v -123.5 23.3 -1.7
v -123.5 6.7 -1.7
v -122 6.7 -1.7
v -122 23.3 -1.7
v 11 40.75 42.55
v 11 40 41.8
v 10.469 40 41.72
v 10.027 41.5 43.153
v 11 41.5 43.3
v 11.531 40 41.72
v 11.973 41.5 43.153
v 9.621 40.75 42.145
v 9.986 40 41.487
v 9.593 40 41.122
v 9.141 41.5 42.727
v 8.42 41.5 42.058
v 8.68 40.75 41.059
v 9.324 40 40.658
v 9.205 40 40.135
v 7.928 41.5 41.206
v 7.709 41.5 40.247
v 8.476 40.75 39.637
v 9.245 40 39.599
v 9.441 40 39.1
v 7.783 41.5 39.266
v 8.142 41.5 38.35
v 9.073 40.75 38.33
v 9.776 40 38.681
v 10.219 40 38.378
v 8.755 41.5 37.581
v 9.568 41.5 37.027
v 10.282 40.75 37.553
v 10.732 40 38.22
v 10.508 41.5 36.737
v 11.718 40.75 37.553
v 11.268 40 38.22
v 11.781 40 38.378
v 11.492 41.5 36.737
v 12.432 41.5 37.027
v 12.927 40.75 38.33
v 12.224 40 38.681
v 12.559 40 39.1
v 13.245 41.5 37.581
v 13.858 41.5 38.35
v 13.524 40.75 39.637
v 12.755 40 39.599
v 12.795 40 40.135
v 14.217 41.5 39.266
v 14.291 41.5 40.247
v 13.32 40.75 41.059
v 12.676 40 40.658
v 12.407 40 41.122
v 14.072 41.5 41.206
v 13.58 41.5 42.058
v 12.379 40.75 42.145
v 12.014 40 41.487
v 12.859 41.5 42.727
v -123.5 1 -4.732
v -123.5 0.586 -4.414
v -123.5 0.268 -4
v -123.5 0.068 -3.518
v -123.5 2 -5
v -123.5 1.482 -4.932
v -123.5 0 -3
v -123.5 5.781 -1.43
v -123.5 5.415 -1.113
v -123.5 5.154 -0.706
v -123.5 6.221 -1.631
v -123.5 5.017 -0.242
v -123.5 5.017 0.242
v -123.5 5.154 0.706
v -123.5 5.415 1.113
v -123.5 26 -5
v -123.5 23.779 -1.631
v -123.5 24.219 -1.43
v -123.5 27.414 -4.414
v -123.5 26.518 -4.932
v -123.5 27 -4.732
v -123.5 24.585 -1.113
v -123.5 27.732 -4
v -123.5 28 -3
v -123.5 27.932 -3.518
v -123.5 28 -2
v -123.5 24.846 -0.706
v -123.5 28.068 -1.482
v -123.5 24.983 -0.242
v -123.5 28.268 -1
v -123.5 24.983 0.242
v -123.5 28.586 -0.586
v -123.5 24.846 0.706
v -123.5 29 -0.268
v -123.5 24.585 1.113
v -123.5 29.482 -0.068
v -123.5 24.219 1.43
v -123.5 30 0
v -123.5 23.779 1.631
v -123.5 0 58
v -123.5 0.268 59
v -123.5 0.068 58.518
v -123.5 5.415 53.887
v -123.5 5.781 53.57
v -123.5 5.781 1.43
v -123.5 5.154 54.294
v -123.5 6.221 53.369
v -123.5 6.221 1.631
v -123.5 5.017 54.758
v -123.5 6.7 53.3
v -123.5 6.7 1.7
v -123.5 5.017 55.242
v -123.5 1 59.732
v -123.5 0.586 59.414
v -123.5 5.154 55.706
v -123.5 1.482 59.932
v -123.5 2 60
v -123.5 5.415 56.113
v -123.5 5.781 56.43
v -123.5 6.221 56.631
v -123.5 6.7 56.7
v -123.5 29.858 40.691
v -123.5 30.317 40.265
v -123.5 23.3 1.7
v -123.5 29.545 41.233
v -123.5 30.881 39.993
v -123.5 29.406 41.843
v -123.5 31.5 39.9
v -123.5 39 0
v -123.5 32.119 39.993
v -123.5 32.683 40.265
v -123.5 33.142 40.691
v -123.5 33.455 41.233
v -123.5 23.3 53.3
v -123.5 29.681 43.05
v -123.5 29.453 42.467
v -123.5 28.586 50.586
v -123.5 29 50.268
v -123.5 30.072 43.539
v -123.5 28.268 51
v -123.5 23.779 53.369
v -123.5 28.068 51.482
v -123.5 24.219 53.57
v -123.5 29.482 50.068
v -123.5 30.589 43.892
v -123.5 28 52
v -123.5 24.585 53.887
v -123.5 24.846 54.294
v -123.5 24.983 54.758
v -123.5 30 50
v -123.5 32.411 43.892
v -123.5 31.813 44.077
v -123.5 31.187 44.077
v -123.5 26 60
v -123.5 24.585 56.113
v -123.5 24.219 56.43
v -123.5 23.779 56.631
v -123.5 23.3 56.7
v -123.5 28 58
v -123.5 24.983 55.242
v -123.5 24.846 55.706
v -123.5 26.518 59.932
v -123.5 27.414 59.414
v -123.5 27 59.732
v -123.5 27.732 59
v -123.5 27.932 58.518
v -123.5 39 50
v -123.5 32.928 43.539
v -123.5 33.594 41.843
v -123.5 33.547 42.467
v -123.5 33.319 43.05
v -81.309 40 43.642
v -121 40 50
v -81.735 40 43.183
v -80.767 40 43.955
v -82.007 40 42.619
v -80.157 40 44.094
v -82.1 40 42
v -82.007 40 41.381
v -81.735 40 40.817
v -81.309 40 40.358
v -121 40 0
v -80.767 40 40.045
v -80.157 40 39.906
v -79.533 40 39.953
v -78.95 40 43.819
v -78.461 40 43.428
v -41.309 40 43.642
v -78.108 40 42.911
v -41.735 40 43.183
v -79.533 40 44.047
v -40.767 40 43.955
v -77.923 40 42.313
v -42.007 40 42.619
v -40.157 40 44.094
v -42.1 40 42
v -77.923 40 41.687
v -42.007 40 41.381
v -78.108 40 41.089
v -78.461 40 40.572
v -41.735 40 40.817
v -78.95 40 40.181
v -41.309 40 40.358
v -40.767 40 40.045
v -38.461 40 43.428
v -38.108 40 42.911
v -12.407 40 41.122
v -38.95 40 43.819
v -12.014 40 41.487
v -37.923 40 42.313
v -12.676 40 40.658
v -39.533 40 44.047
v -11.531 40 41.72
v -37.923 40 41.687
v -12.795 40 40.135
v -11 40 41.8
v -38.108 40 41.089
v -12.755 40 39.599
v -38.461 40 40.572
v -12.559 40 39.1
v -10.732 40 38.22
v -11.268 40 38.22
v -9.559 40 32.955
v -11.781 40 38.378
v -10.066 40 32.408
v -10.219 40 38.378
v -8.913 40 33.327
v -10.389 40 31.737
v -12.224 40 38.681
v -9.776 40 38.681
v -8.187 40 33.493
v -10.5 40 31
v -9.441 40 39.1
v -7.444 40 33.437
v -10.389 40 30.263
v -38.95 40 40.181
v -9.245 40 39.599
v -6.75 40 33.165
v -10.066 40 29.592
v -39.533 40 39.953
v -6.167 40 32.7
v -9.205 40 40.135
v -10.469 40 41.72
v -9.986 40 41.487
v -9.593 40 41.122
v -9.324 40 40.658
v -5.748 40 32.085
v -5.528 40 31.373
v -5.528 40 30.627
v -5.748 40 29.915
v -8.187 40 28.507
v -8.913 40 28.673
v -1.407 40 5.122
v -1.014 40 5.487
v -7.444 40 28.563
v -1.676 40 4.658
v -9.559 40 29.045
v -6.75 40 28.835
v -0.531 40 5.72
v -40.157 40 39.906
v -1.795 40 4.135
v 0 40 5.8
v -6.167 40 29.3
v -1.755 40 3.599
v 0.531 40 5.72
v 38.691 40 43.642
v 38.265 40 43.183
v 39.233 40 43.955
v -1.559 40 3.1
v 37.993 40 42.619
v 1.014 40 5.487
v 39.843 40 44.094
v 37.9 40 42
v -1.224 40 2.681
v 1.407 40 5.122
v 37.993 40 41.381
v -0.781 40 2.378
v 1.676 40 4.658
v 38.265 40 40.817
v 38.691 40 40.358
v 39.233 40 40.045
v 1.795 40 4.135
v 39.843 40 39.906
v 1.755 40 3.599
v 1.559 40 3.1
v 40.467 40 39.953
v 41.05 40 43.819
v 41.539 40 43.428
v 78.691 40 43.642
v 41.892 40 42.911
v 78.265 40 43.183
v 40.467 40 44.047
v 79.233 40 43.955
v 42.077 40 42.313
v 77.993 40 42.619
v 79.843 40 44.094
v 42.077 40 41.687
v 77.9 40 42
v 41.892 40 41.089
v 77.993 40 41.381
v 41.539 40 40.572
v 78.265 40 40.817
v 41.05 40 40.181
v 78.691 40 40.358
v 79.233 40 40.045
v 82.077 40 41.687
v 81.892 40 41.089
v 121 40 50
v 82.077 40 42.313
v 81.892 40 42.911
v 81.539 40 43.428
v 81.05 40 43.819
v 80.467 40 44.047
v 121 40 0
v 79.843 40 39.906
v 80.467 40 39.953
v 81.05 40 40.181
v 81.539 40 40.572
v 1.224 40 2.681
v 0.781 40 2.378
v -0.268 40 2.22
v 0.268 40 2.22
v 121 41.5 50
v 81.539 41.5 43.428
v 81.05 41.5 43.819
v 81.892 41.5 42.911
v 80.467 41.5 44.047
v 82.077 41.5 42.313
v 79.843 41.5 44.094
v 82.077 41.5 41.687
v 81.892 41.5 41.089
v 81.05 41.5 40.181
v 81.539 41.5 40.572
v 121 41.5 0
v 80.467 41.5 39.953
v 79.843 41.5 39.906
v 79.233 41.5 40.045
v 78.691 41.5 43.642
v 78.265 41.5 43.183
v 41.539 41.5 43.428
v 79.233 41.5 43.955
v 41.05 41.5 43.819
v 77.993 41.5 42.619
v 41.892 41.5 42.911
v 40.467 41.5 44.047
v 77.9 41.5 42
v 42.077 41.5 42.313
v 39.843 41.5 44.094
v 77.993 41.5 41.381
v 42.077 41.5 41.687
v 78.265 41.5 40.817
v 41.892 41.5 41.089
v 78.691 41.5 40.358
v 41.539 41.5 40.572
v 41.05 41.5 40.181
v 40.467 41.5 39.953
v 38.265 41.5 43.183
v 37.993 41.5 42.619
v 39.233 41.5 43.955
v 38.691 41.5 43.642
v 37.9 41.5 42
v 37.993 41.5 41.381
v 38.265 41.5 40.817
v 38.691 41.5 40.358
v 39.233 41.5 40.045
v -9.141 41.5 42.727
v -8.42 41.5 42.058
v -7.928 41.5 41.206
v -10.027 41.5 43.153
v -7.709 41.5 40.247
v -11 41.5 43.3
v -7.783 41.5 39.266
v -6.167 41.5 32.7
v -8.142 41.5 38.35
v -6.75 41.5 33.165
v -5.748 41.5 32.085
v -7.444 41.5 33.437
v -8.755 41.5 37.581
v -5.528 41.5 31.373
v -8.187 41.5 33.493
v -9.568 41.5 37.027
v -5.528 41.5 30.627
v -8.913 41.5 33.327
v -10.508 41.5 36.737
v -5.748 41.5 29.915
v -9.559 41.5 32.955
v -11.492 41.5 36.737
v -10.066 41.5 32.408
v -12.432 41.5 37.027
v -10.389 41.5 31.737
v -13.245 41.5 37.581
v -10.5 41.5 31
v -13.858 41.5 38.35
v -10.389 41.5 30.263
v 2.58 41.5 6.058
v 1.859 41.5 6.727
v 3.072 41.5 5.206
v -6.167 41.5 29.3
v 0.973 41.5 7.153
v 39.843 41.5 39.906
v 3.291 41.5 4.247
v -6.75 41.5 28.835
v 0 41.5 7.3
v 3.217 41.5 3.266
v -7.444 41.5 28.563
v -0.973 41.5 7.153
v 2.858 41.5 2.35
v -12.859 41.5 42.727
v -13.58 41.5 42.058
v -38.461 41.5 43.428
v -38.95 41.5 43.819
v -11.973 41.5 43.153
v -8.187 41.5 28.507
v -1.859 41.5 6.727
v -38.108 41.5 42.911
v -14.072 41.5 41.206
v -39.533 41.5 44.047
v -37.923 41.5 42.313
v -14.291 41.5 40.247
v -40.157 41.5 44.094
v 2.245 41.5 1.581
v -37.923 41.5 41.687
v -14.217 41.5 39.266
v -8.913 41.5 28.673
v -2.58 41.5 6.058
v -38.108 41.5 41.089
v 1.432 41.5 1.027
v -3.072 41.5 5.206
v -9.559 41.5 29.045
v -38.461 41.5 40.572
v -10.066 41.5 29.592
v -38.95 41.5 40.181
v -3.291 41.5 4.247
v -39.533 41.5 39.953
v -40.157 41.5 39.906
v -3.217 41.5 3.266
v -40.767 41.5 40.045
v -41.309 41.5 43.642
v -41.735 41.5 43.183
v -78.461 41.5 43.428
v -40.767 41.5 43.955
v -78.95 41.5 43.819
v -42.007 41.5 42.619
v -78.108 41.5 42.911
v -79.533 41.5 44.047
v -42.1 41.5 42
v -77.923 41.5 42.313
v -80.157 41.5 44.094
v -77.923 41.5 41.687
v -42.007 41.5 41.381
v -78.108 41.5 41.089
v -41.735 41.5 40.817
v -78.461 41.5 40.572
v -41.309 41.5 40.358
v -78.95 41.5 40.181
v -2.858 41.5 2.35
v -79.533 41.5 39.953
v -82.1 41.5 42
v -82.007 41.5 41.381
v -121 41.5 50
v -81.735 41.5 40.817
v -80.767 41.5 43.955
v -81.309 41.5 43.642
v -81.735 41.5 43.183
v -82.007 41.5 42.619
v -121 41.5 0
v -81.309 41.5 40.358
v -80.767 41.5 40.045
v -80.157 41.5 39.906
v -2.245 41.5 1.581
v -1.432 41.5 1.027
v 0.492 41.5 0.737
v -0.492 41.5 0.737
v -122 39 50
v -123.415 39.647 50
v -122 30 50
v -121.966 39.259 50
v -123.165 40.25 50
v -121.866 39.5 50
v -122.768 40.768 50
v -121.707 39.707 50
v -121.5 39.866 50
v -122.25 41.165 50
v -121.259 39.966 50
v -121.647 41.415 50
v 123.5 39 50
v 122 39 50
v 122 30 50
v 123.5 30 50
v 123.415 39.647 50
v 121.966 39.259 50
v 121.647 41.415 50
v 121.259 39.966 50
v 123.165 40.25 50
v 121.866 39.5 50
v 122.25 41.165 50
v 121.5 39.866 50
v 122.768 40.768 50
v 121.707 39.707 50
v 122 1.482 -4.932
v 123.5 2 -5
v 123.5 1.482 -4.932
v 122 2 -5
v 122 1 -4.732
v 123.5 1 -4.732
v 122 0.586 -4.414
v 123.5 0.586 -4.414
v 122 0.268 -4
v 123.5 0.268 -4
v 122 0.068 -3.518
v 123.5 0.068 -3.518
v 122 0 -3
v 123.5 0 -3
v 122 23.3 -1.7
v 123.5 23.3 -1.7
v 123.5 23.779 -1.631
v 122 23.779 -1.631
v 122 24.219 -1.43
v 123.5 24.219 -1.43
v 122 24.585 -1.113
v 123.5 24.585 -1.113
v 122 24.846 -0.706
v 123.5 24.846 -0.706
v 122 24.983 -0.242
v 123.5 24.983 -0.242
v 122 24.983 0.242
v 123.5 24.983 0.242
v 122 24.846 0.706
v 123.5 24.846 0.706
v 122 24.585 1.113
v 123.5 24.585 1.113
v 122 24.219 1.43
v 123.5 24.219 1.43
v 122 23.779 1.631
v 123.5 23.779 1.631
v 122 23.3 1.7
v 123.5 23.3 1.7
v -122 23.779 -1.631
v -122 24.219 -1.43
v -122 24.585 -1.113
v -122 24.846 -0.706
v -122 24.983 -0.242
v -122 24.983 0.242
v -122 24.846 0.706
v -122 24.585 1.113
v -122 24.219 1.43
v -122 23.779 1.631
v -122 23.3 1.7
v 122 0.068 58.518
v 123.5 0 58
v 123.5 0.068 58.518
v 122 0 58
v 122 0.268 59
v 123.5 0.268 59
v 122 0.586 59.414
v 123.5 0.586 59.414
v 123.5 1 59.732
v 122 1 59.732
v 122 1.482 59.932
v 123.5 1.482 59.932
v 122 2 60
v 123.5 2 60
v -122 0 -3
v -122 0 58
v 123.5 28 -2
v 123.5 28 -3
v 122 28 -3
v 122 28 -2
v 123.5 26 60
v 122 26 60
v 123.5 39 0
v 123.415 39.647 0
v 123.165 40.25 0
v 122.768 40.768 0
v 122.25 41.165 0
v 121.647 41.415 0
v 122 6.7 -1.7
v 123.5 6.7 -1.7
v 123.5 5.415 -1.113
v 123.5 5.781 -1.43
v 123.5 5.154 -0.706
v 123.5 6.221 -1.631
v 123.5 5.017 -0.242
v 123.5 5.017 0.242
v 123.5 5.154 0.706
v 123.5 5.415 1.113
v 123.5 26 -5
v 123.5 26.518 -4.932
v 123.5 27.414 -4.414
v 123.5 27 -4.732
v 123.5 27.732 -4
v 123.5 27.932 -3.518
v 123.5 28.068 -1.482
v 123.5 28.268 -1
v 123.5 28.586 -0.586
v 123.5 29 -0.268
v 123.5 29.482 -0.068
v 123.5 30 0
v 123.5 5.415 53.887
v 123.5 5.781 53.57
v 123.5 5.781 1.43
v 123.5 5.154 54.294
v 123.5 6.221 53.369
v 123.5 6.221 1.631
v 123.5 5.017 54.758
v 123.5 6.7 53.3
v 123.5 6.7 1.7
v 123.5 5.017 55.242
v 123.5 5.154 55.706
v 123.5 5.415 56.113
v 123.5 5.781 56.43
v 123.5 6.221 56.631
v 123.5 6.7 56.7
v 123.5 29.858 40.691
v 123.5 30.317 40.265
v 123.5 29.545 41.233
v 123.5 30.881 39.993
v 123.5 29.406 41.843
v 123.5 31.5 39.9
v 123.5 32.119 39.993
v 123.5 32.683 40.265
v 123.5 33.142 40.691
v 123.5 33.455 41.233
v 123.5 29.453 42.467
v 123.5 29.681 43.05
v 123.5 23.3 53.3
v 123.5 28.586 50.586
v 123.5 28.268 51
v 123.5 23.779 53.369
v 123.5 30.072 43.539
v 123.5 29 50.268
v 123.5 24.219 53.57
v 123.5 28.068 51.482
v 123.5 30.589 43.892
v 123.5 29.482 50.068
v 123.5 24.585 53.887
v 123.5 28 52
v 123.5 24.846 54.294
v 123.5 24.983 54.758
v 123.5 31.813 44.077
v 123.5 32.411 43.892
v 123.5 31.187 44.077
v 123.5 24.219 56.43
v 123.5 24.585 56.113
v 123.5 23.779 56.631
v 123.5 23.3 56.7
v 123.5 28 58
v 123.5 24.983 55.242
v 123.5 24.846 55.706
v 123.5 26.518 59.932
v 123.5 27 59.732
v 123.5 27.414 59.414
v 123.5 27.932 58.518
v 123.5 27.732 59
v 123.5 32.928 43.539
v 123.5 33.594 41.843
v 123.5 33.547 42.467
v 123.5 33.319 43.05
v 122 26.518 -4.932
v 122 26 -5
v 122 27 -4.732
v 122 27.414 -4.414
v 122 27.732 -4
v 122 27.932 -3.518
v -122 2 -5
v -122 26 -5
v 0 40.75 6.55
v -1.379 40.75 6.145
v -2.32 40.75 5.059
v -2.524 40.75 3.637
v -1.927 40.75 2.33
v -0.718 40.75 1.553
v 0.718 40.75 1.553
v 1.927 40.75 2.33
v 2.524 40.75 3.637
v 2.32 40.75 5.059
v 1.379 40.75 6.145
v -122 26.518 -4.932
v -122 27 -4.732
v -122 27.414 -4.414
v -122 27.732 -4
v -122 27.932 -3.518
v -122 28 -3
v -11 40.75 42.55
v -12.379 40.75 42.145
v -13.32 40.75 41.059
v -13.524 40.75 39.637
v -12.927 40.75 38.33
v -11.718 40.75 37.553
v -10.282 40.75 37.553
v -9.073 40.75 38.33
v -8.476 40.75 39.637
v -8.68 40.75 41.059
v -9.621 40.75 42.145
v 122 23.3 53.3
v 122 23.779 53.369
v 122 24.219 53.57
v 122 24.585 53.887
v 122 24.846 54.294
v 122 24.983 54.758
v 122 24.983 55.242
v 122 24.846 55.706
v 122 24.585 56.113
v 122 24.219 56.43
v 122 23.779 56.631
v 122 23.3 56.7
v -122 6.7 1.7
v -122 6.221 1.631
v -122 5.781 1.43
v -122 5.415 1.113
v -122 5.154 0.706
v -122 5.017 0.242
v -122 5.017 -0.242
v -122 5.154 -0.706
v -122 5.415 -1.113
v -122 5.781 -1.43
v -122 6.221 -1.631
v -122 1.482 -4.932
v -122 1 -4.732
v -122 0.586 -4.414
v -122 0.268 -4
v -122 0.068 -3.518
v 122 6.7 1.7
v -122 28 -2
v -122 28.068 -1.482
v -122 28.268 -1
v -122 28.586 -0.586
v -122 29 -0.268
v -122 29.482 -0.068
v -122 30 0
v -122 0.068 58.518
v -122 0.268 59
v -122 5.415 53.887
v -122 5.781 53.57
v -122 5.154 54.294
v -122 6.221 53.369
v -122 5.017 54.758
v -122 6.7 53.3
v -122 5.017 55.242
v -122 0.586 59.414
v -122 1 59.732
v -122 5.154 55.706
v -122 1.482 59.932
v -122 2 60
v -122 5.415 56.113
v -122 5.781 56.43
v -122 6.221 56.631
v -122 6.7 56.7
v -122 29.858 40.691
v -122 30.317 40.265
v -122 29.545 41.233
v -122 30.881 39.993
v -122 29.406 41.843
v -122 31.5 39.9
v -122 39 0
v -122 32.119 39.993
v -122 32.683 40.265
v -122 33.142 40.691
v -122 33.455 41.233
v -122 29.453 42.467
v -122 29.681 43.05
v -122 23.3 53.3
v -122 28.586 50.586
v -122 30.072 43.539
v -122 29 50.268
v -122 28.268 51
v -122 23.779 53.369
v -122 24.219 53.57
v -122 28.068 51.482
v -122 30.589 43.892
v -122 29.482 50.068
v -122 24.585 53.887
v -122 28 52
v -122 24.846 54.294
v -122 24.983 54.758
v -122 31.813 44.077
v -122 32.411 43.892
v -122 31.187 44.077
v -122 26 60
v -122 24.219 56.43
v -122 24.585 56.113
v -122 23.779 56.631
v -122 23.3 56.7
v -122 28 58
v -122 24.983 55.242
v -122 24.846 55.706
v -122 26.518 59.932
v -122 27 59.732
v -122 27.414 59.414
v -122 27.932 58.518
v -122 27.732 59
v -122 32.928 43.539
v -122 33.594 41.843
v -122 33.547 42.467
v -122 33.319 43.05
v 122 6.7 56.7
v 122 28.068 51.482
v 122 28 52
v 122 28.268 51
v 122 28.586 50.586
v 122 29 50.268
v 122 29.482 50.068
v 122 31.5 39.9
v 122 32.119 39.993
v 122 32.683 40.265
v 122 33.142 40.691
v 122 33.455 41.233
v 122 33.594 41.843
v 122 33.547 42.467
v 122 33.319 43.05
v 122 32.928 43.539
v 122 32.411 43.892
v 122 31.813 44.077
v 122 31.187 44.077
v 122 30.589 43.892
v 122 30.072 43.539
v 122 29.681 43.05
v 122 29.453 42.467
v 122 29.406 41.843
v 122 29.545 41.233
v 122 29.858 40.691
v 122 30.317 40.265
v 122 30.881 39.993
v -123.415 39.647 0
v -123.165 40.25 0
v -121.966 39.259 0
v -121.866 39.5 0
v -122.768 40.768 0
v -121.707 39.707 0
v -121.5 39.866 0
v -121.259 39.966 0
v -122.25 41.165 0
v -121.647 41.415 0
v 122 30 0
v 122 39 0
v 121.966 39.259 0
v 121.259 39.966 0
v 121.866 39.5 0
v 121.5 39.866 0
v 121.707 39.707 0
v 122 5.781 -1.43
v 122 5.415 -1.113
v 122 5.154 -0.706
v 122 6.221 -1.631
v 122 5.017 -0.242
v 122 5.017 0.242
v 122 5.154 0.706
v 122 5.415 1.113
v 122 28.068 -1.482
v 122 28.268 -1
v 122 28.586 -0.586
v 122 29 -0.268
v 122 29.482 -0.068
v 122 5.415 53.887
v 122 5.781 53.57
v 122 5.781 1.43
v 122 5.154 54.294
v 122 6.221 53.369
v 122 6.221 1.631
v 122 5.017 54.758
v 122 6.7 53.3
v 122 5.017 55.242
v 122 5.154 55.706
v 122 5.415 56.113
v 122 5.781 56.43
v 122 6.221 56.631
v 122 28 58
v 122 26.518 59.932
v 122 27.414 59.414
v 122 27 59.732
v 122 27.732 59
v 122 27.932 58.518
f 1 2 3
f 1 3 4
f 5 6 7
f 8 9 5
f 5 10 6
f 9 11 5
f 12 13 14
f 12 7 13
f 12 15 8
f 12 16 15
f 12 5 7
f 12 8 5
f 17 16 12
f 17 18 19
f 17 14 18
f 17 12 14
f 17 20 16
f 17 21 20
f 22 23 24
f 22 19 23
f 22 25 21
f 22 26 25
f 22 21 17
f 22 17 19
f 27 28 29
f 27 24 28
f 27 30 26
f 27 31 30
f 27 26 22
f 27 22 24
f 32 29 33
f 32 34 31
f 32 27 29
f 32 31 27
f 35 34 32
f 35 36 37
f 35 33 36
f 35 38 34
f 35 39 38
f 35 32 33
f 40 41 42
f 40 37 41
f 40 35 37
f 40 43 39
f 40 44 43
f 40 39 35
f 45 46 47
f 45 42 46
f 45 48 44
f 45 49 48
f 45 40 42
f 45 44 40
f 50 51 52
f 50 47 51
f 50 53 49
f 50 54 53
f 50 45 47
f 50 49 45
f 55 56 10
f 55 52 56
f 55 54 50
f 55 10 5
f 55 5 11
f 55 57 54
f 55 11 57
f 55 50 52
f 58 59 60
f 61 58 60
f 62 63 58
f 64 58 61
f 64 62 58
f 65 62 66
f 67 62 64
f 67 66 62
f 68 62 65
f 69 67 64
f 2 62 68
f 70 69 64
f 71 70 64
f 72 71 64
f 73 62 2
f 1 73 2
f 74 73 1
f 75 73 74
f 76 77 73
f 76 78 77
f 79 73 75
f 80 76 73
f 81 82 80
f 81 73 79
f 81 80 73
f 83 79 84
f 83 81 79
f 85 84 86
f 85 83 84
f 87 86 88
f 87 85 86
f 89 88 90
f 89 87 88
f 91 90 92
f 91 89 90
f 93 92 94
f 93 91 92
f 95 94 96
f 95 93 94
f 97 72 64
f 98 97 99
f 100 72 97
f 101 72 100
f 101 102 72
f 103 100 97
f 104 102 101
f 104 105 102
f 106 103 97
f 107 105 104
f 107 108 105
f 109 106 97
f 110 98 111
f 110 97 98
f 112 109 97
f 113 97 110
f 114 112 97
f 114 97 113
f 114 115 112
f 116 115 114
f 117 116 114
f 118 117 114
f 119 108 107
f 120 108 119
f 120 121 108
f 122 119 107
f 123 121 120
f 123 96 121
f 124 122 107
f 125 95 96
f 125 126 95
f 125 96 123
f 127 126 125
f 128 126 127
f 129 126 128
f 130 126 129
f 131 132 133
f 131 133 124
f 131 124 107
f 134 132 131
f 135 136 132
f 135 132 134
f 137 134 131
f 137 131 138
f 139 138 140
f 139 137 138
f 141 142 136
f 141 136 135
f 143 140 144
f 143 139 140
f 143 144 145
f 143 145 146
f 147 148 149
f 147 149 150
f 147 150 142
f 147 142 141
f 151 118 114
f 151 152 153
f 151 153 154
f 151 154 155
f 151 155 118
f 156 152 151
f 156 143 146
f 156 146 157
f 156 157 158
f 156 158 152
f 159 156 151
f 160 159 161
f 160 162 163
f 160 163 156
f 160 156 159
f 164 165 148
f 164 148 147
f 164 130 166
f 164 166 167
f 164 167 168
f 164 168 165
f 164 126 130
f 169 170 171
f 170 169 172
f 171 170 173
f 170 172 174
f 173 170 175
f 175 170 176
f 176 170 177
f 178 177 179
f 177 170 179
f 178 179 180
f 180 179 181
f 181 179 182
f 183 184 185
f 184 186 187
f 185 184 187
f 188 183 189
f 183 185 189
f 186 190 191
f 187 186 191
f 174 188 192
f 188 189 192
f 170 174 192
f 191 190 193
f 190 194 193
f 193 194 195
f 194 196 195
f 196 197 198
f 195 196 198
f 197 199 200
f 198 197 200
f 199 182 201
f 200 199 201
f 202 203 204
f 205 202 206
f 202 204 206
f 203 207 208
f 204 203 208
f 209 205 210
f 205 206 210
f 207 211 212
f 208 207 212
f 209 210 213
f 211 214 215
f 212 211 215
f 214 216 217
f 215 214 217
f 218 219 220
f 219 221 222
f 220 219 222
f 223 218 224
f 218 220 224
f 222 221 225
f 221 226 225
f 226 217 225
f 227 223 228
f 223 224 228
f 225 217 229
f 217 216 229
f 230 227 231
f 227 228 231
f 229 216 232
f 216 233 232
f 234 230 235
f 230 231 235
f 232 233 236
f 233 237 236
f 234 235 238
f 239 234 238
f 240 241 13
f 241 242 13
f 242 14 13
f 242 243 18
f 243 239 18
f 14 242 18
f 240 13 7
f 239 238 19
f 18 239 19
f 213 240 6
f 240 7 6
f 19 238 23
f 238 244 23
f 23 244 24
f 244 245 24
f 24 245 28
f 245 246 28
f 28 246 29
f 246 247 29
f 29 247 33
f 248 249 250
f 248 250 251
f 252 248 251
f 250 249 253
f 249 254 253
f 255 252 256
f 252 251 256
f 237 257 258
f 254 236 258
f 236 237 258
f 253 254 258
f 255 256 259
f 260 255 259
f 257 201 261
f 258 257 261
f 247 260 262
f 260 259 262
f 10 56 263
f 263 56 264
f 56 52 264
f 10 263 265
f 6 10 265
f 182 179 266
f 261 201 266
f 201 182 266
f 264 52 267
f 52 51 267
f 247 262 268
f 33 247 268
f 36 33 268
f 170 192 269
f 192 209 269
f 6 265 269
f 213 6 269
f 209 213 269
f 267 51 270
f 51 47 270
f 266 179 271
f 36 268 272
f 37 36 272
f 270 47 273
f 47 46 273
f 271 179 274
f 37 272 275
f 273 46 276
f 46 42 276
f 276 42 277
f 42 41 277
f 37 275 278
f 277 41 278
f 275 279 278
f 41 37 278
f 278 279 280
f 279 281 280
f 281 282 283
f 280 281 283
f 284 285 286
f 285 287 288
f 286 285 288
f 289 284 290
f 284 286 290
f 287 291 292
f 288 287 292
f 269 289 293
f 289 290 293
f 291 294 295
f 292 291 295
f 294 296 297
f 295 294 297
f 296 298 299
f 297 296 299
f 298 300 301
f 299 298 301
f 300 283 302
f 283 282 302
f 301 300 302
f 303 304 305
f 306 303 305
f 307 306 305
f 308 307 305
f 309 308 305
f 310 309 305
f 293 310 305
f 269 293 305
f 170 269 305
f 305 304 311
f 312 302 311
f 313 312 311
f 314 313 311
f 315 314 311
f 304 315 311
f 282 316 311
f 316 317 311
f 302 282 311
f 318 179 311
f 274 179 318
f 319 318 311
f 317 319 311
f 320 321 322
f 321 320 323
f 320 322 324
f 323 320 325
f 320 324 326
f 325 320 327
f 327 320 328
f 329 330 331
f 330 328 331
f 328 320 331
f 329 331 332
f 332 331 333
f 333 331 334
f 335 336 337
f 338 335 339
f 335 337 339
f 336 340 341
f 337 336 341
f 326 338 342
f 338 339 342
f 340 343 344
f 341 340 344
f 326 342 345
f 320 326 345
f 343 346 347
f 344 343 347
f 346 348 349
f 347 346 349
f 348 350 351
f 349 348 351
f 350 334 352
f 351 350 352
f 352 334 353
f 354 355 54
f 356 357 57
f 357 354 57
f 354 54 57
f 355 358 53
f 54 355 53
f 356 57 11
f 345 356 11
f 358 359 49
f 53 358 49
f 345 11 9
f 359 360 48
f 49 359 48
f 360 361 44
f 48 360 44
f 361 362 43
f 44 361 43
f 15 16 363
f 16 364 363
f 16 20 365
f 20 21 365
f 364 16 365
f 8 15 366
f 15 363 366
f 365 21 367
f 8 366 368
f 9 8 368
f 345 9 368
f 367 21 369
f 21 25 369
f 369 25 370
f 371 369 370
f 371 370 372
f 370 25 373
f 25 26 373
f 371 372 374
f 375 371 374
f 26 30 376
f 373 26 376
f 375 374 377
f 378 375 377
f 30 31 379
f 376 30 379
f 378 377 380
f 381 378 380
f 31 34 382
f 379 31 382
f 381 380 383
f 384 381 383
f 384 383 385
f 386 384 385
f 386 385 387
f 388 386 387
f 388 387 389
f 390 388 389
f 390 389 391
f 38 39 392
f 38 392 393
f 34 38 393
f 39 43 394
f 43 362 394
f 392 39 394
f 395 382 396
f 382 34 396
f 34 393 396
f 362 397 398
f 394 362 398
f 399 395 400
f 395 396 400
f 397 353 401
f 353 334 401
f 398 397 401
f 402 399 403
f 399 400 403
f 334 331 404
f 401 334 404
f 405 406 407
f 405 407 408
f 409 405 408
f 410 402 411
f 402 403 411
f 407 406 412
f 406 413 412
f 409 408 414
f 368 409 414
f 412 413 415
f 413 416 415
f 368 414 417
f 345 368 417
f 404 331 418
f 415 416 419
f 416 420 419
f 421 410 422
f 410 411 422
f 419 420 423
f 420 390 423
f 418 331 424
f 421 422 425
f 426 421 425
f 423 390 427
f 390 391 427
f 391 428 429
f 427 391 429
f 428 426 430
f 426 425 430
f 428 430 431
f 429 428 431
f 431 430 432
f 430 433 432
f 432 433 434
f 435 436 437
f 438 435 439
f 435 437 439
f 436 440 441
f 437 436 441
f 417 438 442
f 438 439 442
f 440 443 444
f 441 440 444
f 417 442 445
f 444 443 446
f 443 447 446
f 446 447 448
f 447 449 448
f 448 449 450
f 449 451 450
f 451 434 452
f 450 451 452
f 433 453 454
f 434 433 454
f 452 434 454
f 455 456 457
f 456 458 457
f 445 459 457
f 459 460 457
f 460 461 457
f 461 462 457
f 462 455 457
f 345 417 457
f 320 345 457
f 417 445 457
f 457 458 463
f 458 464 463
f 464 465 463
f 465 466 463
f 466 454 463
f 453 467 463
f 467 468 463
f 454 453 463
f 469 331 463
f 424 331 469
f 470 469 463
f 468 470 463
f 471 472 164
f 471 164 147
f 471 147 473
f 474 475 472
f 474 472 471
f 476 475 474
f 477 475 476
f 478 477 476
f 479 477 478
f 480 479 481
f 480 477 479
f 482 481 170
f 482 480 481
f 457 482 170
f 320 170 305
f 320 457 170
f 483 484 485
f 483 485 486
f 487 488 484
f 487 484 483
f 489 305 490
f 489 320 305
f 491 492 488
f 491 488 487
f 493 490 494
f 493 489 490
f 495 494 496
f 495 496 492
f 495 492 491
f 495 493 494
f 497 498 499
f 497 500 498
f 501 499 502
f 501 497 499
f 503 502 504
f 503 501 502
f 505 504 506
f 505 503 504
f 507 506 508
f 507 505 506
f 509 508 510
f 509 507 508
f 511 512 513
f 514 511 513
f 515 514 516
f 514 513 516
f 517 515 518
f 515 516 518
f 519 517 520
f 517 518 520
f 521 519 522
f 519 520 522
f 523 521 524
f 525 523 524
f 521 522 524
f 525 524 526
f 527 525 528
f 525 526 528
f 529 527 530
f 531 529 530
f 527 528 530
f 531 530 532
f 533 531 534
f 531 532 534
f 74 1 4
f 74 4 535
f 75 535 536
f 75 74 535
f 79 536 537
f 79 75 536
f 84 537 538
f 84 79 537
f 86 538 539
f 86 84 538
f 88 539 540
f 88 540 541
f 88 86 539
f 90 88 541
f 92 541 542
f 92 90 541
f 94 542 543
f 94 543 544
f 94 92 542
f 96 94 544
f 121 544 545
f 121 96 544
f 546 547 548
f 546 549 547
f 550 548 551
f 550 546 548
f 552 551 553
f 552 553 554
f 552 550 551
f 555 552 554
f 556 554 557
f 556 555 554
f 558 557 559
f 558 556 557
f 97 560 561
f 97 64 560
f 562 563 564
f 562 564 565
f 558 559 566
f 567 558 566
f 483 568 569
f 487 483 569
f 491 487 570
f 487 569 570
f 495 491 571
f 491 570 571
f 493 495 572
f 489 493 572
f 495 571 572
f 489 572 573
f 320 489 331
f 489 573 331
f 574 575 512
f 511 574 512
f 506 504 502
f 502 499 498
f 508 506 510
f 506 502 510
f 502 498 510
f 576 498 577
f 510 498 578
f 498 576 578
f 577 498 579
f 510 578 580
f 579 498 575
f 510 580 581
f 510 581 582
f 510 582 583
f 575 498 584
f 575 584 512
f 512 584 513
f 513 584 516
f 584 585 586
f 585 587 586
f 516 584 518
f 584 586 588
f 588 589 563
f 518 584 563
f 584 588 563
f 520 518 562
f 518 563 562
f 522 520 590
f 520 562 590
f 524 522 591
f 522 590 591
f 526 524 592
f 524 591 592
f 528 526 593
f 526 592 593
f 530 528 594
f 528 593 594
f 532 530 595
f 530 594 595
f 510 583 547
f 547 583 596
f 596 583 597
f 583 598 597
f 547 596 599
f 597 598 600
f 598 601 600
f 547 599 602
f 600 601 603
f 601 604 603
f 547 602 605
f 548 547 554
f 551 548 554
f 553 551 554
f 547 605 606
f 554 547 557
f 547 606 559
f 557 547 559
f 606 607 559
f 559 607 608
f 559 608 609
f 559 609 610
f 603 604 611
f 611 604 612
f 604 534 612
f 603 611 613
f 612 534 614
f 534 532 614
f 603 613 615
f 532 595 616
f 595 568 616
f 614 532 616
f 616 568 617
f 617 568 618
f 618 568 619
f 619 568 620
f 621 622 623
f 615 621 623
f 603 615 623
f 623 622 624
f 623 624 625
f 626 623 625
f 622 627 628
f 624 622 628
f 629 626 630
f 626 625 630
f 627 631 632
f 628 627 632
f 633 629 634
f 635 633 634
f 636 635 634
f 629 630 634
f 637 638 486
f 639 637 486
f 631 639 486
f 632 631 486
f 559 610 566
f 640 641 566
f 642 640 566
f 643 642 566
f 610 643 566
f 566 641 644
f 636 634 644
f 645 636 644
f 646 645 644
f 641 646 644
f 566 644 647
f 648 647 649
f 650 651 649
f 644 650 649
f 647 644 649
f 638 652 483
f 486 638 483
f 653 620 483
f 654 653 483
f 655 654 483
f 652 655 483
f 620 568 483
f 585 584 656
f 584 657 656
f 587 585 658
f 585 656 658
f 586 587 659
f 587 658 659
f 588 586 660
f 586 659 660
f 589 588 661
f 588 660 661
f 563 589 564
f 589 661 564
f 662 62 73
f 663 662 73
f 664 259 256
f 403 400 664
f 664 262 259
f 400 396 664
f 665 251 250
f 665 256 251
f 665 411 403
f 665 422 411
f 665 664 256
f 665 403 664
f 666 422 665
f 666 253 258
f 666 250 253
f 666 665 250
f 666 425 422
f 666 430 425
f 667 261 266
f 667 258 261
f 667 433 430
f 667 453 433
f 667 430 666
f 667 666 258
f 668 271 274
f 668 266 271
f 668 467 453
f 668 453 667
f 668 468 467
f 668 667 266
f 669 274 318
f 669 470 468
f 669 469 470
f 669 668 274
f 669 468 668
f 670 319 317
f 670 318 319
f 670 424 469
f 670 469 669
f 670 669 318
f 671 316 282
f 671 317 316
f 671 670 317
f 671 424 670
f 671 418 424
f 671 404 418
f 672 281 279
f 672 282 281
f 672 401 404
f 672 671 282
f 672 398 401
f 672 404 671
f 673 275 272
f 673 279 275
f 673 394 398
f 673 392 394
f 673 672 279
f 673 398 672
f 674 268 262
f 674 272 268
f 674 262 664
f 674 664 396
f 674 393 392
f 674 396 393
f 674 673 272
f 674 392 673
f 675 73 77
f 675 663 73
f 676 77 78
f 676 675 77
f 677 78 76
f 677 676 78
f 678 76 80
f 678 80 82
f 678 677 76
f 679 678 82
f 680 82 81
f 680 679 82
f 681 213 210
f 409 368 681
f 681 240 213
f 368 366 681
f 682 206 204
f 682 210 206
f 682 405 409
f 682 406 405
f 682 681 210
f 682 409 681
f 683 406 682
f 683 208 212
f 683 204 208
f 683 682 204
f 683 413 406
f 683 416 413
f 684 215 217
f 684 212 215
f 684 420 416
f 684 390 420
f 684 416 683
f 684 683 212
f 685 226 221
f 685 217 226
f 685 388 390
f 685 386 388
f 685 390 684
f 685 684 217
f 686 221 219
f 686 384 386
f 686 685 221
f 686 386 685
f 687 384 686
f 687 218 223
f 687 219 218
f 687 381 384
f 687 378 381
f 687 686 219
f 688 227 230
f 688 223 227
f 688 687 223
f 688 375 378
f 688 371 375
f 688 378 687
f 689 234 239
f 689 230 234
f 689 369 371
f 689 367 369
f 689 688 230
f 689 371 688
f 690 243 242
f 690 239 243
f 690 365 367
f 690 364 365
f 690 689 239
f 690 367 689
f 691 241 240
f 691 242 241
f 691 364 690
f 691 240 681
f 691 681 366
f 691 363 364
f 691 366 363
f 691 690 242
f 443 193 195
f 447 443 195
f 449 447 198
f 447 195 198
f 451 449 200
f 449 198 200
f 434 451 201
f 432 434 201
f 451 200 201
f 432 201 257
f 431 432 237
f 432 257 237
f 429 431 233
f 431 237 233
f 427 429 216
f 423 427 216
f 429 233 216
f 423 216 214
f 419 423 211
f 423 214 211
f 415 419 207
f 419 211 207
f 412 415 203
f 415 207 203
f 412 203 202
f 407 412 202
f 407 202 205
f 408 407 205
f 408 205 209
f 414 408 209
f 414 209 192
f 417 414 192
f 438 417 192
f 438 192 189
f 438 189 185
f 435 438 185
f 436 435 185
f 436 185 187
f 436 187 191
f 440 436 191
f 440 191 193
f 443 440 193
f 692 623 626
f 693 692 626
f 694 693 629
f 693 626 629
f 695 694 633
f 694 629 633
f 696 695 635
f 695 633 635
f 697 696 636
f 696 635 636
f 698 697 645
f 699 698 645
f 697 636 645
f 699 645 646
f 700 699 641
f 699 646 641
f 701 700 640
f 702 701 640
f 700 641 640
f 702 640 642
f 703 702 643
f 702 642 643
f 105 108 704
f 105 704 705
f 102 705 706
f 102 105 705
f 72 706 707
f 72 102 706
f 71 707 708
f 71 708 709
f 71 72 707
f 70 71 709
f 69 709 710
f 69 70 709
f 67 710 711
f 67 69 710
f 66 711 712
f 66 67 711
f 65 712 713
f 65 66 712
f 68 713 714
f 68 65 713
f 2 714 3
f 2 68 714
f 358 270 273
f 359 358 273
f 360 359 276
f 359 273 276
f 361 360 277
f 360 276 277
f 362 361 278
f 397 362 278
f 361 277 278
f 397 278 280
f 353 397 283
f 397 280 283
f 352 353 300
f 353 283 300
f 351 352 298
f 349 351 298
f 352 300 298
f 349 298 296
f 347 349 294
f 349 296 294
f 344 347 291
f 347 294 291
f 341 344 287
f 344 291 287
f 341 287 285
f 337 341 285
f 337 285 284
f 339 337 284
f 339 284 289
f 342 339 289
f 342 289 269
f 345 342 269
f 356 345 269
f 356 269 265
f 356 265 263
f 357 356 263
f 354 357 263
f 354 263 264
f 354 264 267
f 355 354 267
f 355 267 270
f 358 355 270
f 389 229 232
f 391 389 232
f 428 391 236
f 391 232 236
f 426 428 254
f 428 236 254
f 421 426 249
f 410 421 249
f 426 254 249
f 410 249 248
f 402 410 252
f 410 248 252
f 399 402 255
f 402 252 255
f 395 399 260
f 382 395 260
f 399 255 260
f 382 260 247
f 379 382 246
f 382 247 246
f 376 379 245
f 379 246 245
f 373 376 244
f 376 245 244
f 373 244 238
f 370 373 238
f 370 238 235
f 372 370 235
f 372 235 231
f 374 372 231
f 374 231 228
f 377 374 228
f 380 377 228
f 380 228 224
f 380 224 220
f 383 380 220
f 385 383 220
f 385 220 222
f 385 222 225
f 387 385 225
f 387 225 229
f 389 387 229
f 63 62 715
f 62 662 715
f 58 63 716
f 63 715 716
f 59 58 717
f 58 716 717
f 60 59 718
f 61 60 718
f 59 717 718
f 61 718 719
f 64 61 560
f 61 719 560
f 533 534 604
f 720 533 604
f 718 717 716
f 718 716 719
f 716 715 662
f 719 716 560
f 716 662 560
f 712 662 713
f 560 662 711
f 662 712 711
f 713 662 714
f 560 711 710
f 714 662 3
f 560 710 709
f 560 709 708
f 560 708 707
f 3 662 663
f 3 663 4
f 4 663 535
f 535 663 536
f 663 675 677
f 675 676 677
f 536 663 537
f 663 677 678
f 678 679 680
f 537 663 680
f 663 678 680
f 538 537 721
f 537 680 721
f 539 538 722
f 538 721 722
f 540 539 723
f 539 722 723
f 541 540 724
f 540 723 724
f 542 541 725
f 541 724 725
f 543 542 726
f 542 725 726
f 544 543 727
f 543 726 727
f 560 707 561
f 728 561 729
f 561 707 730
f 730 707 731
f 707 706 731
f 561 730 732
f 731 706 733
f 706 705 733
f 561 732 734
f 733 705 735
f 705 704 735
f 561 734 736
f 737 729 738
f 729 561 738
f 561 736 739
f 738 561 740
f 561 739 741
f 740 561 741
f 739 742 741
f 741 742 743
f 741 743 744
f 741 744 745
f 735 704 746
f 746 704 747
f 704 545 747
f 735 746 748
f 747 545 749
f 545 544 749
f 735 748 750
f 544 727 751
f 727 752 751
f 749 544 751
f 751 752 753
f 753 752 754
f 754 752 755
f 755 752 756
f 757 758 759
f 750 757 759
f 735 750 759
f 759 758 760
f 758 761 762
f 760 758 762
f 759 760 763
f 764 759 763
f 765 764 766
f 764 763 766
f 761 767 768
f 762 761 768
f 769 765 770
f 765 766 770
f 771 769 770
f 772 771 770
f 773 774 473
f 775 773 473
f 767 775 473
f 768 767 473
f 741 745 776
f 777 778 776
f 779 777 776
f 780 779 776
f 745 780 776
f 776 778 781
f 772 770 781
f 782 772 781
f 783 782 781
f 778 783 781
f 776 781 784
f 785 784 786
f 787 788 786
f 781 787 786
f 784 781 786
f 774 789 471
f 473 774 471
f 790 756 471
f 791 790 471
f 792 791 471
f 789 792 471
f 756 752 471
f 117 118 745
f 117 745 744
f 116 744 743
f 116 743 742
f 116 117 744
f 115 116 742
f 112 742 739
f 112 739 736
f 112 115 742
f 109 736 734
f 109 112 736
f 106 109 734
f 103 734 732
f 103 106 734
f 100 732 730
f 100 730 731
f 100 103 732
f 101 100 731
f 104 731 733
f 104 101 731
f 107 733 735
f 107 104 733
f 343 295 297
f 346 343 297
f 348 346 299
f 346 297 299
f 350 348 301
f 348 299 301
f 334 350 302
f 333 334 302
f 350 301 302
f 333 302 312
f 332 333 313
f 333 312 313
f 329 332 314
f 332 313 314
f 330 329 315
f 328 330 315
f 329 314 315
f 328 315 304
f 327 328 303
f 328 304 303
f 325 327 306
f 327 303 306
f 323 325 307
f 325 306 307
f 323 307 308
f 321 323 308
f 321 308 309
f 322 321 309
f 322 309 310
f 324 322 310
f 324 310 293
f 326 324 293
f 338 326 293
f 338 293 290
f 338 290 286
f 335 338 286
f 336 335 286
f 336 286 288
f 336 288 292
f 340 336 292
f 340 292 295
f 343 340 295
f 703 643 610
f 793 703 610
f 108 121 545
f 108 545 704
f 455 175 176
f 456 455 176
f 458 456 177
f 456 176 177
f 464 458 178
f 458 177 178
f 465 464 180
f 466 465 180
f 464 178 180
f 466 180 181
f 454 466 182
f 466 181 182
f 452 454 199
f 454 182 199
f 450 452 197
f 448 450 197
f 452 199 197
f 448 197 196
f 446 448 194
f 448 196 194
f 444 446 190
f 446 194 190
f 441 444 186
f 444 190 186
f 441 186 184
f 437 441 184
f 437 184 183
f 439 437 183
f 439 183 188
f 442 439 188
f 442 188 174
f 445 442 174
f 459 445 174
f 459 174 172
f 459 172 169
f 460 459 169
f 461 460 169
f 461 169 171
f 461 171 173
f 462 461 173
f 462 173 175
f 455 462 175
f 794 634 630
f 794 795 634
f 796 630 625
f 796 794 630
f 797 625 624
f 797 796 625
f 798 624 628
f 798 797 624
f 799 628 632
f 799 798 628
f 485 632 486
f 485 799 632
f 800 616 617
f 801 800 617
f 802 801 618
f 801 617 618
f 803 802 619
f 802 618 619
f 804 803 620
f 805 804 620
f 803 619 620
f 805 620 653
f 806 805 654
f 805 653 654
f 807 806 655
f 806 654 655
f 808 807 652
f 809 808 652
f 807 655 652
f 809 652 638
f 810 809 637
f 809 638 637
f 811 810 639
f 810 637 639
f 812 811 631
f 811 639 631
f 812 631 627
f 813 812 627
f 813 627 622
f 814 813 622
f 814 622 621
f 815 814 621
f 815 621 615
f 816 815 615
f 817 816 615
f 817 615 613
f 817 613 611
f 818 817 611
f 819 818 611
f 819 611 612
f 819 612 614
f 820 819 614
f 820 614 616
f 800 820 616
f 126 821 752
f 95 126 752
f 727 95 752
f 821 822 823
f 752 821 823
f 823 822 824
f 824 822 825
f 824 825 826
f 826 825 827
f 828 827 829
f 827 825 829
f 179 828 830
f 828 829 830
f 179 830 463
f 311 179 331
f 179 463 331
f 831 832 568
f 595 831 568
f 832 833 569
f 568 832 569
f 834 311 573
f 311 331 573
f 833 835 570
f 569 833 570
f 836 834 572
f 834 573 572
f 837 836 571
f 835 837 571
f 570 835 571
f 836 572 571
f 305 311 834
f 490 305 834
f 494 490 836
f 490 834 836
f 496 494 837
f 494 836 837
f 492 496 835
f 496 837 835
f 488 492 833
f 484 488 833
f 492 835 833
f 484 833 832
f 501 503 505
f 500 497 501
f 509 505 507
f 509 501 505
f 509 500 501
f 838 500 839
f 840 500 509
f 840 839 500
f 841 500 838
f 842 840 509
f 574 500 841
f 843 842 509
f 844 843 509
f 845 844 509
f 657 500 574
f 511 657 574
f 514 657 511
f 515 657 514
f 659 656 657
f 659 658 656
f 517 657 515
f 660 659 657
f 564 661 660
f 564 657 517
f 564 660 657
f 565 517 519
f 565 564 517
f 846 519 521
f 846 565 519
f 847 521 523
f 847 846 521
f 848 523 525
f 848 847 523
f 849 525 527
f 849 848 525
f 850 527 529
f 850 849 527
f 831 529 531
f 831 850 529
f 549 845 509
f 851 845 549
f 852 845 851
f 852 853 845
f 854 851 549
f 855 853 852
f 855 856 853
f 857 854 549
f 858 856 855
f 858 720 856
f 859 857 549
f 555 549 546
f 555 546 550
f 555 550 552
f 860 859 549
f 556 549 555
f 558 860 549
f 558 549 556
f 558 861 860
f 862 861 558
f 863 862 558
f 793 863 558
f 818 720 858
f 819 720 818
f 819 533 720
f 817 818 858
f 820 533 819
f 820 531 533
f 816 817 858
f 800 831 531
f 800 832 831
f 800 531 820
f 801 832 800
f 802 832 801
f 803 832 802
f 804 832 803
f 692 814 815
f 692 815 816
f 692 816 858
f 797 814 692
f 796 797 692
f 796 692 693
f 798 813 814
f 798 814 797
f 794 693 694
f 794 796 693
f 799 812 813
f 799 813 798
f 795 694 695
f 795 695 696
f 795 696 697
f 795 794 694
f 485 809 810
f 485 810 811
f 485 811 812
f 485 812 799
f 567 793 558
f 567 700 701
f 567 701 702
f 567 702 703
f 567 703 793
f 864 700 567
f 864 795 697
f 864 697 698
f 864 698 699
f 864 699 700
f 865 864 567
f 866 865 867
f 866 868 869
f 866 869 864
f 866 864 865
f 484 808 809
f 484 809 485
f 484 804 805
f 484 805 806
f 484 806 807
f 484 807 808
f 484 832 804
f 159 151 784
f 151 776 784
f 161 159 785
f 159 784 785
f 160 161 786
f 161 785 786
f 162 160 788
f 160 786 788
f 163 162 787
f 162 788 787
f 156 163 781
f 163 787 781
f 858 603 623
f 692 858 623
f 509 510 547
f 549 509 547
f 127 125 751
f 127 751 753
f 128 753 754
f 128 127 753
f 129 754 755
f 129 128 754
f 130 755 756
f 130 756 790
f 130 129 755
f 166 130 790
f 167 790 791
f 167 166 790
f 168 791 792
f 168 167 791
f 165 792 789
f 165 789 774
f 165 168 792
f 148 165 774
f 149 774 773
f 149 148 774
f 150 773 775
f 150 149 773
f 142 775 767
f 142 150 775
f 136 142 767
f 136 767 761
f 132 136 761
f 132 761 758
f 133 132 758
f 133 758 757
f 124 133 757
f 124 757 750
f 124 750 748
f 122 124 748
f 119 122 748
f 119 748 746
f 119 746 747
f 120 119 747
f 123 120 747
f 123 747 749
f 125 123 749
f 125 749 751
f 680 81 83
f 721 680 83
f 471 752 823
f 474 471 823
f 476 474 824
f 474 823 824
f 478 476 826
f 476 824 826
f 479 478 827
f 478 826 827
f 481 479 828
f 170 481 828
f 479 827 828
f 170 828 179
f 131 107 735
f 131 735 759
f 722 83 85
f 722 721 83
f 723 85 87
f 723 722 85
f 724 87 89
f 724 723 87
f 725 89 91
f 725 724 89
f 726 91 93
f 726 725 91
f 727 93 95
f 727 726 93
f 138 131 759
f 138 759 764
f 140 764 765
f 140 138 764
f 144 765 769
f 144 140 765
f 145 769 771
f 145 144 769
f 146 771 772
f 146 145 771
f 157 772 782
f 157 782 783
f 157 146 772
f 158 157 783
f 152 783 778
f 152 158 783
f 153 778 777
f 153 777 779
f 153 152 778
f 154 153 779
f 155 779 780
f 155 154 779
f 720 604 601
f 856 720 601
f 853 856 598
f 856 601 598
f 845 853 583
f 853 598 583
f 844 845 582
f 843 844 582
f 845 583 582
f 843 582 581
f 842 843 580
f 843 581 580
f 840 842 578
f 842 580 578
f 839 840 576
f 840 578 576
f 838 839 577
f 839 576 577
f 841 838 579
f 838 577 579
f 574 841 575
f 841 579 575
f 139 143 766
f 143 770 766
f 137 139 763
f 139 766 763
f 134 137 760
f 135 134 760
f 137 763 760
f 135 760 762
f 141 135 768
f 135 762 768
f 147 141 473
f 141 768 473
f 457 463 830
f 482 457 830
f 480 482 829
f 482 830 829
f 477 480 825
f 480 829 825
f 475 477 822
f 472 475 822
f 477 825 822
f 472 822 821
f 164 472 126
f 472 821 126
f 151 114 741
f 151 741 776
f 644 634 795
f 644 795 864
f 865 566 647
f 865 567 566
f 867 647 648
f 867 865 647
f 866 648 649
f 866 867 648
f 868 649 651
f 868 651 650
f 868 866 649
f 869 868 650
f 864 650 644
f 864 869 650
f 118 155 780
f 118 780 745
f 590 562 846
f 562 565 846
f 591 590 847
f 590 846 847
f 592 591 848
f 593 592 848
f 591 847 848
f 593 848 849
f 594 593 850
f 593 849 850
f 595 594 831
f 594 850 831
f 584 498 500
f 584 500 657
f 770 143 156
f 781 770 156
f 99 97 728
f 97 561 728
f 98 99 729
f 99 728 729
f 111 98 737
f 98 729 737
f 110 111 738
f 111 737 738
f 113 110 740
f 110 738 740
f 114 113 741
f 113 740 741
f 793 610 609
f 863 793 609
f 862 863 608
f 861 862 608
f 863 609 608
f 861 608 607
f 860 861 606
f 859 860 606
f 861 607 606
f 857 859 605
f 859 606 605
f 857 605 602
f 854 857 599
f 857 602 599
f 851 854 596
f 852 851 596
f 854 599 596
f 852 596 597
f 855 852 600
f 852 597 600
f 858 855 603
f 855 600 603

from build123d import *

# Parameters (mm, degrees)
SM_BASE_FLANGE_1_DEPTH       = 50
HOLE_WIZARD_1_AT_2_COUNT     = 2
HOLE_WIZARD_1_AT_2_PITCH     = 37.643060449
HOLE_WIZARD_1_AT_3_COUNT     = 2
HOLE_WIZARD_1_AT_3_PITCH     = 37.643060449
HOLE_WIZARD_4_2_4_2_1_D      = 4.2
HOLE_WIZARD_4_2_4_2_2_REACH  = 257.404
HOLE_WIZARD_4_2_4_2_2_BORE_R = 2.1
HOLE_WIZARD_5_0_5_1_D        = 5
SKETCH_18_W                  = 65
SKETCH_18_H                  = 28
SM_BASE_FLANGE_1_2_DEPTH     = 1.5
HOLE_START                   = -123.5
HOLE_WIZARD_3_4_3_4_2_DEPTH  = 1.5
FILLET_1_R                   = 2
FILLET_1_OF_MIRROR_2_R       = 2


# Read off the part's stored shape, not the designer's step: 基体-法兰1, Ø3.4 (3.4) 直径槽口2
# Sheet-metal steps are written as plain solids
with BuildPart() as part:
    # Sm Base Flange 1 outline → Sm Base Flange 1 (new body)
    with BuildSketch(Plane.XY):
        with BuildLine():
            Line((122, 39), (122, 0))
            Line((122, 0), (123.5, 0))
            Line((123.5, 0), (123.5, 39))
            ThreePointArc((123.5, 39), (122.767766953, 40.767766953), (121, 41.5))
            Line((121, 41.5), (-121, 41.5))
            ThreePointArc((-121, 41.5), (-122.767766953, 40.767766953), (-123.5, 39))
            Line((-123.5, 39), (-123.5, 0))
            Line((-123.5, 0), (-122, 0))
            Line((-122, 0), (-122, 39))
            ThreePointArc((-122, 39), (-121.707106781, 39.707106781), (-121, 40))
            Line((-121, 40), (121, 40))
            ThreePointArc((121, 40), (121.707106781, 39.707106781), (122, 39))
        make_face()
    extrude(amount=SM_BASE_FLANGE_1_DEPTH)

    # 草图9 → 打孔尺寸(%根据)开槽沉头木螺钉的类型1 (revolve, cut)
    with BuildSketch(Plane(origin=(0, 41.5, 4), x_dir=(0, 0, 1), z_dir=(1, 0, 0))):
        Polygon((0, 0), (0, 1.5), (1.7, 1.5), (1.7, 1.6), (3.3, 0), align=None)
    hole_wizard_1 = revolve(axis=Axis((0, 47.85, 4), (0, -1, 0)), mode=Mode.SUBTRACT)

    # 打孔尺寸(%根据)开槽沉头木螺钉的类型1 at 2: 打孔尺寸(%根据)开槽沉头木螺钉的类型1 ×2
    with Locations(*[Vector(-0.29221853559902017, 0, 0.956351571051339) * (i * HOLE_WIZARD_1_AT_2_PITCH) for i in range(1, HOLE_WIZARD_1_AT_2_COUNT)]):
        add(hole_wizard_1, mode=Mode.SUBTRACT)

    # 打孔尺寸(%根据)开槽沉头木螺钉的类型1 at 3: 打孔尺寸(%根据)开槽沉头木螺钉的类型1 ×2
    with Locations(*[Vector(0.2922185355990204, 0, 0.956351571051339) * (i * HOLE_WIZARD_1_AT_3_PITCH) for i in range(1, HOLE_WIZARD_1_AT_3_COUNT)]):
        add(hole_wizard_1, mode=Mode.SUBTRACT)

    # Ø4.2 (4.2) 直径孔1 (through all)
    with Locations(Plane(origin=(0, 41.5, 0), x_dir=(1, 0, 0), z_dir=(0, 1, 0))):
        with Locations((-40, -42), (-80, -42), (40, -42), (80, -42)):
            Hole(HOLE_WIZARD_4_2_4_2_1_D / 2)

    # Ø4.2 (4.2) 直径孔2 bore → Ø4.2 (4.2) 直径孔2 (cut, up to next)
    with BuildSketch(Plane(origin=(123.5, 0, 0), x_dir=(0, 0, -1), z_dir=(1, 0, 0)), mode=Mode.PRIVATE) as hole_wizard_4_2_4_2_2_sk1:
        with Locations((-42, 31.5)):
            Circle(HOLE_WIZARD_4_2_4_2_2_BORE_R)
    hole_wizard_4_2_4_2_2_tool1 = extrude(hole_wizard_4_2_4_2_2_sk1.sketch, amount=-HOLE_WIZARD_4_2_4_2_2_REACH, mode=Mode.PRIVATE) & part.part
    hole_wizard_4_2_4_2_2 = hole_wizard_4_2_4_2_2_tool1.solids().sort_by_distance((123.5, 31.5, 42))[0]
    add(hole_wizard_4_2_4_2_2, mode=Mode.SUBTRACT)

    # 镜向1: Ø4.2 (4.2) 直径孔2 across plane
    add(hole_wizard_4_2_4_2_2.mirror(Plane(origin=(0, 0, 0), x_dir=(0, 0, 1), z_dir=(1, 0, 0))), mode=Mode.SUBTRACT)

    # Ø5.0 (5) 直径孔1 (through all)
    with Locations(Plane(origin=(0, 41.5, 0), x_dir=(1, 0, 0), z_dir=(0, 1, 0))):
        with Locations((-8, -31)):
            Hole(HOLE_WIZARD_5_0_5_1_D / 2)

    # 草图18 → Sm Base Flange 1 2 (add)
    with BuildSketch(Plane.ZY.offset(123.5)):
        with Locations((27.5, 14)):
            Rectangle(SKETCH_18_W, SKETCH_18_H)
    sm_base_flange_1_2 = extrude(amount=-SM_BASE_FLANGE_1_2_DEPTH)

    # Ø3.4 (3.4) 直径槽口2 outline → Ø3.4 (3.4) 直径槽口2 (cut)
    with BuildSketch(Plane.YZ.offset(HOLE_START)):
        with BuildLine():
            ThreePointArc((23.3, 53.3), (25, 55), (23.3, 56.7))
            Line((23.3, 56.7), (6.7, 56.7))
            ThreePointArc((6.7, 56.7), (5, 55), (6.7, 53.3))
            Line((6.7, 53.3), (23.3, 53.3))
        make_face()
        with BuildLine():
            ThreePointArc((23.3, -1.7), (25, 0), (23.3, 1.7))
            Line((23.3, 1.7), (6.7, 1.7))
            ThreePointArc((6.7, 1.7), (5, 0), (6.7, -1.7))
            Line((6.7, -1.7), (23.3, -1.7))
        make_face()
    hole_wizard_3_4_3_4_2 = extrude(amount=HOLE_WIZARD_3_4_3_4_2_DEPTH, mode=Mode.SUBTRACT)

    # 圆角1
    fillet_1_edges = [part.edges().sort_by_distance(p)[0] for p in [
        (-122.75, 28, 0),
        (-122.75, 28, -5),
        (-122.75, 28, 60),
        (-122.75, 0, 60),
        (-122.75, 0, -5),
        (-122.75, 28, 50),
    ]]
    fillet(fillet_1_edges, radius=FILLET_1_R)

    # 镜向2: Sm Base Flange 1 2, Ø3.4 (3.4) 直径槽口2 across plane
    add(sm_base_flange_1_2.mirror(Plane(origin=(0, 0, 0), x_dir=(0, 0, 1), z_dir=(1, 0, 0))))
    add(hole_wizard_3_4_3_4_2.mirror(Plane(origin=(0, 0, 0), x_dir=(0, 0, 1), z_dir=(1, 0, 0))), mode=Mode.SUBTRACT)

    # 圆角1 of 镜向2
    fillet_1_of_mirror_2_edges = [part.edges().sort_by_distance(p)[0] for p in [
        (122.75, 28, 0),
        (122.75, 28, -5),
        (122.75, 28, 60),
        (122.75, 0, 60),
        (122.75, 0, -5),
        (122.75, 28, 50),
    ]]
    fillet(fillet_1_of_mirror_2_edges, radius=FILLET_1_OF_MIRROR_2_R)


solid = part.part
